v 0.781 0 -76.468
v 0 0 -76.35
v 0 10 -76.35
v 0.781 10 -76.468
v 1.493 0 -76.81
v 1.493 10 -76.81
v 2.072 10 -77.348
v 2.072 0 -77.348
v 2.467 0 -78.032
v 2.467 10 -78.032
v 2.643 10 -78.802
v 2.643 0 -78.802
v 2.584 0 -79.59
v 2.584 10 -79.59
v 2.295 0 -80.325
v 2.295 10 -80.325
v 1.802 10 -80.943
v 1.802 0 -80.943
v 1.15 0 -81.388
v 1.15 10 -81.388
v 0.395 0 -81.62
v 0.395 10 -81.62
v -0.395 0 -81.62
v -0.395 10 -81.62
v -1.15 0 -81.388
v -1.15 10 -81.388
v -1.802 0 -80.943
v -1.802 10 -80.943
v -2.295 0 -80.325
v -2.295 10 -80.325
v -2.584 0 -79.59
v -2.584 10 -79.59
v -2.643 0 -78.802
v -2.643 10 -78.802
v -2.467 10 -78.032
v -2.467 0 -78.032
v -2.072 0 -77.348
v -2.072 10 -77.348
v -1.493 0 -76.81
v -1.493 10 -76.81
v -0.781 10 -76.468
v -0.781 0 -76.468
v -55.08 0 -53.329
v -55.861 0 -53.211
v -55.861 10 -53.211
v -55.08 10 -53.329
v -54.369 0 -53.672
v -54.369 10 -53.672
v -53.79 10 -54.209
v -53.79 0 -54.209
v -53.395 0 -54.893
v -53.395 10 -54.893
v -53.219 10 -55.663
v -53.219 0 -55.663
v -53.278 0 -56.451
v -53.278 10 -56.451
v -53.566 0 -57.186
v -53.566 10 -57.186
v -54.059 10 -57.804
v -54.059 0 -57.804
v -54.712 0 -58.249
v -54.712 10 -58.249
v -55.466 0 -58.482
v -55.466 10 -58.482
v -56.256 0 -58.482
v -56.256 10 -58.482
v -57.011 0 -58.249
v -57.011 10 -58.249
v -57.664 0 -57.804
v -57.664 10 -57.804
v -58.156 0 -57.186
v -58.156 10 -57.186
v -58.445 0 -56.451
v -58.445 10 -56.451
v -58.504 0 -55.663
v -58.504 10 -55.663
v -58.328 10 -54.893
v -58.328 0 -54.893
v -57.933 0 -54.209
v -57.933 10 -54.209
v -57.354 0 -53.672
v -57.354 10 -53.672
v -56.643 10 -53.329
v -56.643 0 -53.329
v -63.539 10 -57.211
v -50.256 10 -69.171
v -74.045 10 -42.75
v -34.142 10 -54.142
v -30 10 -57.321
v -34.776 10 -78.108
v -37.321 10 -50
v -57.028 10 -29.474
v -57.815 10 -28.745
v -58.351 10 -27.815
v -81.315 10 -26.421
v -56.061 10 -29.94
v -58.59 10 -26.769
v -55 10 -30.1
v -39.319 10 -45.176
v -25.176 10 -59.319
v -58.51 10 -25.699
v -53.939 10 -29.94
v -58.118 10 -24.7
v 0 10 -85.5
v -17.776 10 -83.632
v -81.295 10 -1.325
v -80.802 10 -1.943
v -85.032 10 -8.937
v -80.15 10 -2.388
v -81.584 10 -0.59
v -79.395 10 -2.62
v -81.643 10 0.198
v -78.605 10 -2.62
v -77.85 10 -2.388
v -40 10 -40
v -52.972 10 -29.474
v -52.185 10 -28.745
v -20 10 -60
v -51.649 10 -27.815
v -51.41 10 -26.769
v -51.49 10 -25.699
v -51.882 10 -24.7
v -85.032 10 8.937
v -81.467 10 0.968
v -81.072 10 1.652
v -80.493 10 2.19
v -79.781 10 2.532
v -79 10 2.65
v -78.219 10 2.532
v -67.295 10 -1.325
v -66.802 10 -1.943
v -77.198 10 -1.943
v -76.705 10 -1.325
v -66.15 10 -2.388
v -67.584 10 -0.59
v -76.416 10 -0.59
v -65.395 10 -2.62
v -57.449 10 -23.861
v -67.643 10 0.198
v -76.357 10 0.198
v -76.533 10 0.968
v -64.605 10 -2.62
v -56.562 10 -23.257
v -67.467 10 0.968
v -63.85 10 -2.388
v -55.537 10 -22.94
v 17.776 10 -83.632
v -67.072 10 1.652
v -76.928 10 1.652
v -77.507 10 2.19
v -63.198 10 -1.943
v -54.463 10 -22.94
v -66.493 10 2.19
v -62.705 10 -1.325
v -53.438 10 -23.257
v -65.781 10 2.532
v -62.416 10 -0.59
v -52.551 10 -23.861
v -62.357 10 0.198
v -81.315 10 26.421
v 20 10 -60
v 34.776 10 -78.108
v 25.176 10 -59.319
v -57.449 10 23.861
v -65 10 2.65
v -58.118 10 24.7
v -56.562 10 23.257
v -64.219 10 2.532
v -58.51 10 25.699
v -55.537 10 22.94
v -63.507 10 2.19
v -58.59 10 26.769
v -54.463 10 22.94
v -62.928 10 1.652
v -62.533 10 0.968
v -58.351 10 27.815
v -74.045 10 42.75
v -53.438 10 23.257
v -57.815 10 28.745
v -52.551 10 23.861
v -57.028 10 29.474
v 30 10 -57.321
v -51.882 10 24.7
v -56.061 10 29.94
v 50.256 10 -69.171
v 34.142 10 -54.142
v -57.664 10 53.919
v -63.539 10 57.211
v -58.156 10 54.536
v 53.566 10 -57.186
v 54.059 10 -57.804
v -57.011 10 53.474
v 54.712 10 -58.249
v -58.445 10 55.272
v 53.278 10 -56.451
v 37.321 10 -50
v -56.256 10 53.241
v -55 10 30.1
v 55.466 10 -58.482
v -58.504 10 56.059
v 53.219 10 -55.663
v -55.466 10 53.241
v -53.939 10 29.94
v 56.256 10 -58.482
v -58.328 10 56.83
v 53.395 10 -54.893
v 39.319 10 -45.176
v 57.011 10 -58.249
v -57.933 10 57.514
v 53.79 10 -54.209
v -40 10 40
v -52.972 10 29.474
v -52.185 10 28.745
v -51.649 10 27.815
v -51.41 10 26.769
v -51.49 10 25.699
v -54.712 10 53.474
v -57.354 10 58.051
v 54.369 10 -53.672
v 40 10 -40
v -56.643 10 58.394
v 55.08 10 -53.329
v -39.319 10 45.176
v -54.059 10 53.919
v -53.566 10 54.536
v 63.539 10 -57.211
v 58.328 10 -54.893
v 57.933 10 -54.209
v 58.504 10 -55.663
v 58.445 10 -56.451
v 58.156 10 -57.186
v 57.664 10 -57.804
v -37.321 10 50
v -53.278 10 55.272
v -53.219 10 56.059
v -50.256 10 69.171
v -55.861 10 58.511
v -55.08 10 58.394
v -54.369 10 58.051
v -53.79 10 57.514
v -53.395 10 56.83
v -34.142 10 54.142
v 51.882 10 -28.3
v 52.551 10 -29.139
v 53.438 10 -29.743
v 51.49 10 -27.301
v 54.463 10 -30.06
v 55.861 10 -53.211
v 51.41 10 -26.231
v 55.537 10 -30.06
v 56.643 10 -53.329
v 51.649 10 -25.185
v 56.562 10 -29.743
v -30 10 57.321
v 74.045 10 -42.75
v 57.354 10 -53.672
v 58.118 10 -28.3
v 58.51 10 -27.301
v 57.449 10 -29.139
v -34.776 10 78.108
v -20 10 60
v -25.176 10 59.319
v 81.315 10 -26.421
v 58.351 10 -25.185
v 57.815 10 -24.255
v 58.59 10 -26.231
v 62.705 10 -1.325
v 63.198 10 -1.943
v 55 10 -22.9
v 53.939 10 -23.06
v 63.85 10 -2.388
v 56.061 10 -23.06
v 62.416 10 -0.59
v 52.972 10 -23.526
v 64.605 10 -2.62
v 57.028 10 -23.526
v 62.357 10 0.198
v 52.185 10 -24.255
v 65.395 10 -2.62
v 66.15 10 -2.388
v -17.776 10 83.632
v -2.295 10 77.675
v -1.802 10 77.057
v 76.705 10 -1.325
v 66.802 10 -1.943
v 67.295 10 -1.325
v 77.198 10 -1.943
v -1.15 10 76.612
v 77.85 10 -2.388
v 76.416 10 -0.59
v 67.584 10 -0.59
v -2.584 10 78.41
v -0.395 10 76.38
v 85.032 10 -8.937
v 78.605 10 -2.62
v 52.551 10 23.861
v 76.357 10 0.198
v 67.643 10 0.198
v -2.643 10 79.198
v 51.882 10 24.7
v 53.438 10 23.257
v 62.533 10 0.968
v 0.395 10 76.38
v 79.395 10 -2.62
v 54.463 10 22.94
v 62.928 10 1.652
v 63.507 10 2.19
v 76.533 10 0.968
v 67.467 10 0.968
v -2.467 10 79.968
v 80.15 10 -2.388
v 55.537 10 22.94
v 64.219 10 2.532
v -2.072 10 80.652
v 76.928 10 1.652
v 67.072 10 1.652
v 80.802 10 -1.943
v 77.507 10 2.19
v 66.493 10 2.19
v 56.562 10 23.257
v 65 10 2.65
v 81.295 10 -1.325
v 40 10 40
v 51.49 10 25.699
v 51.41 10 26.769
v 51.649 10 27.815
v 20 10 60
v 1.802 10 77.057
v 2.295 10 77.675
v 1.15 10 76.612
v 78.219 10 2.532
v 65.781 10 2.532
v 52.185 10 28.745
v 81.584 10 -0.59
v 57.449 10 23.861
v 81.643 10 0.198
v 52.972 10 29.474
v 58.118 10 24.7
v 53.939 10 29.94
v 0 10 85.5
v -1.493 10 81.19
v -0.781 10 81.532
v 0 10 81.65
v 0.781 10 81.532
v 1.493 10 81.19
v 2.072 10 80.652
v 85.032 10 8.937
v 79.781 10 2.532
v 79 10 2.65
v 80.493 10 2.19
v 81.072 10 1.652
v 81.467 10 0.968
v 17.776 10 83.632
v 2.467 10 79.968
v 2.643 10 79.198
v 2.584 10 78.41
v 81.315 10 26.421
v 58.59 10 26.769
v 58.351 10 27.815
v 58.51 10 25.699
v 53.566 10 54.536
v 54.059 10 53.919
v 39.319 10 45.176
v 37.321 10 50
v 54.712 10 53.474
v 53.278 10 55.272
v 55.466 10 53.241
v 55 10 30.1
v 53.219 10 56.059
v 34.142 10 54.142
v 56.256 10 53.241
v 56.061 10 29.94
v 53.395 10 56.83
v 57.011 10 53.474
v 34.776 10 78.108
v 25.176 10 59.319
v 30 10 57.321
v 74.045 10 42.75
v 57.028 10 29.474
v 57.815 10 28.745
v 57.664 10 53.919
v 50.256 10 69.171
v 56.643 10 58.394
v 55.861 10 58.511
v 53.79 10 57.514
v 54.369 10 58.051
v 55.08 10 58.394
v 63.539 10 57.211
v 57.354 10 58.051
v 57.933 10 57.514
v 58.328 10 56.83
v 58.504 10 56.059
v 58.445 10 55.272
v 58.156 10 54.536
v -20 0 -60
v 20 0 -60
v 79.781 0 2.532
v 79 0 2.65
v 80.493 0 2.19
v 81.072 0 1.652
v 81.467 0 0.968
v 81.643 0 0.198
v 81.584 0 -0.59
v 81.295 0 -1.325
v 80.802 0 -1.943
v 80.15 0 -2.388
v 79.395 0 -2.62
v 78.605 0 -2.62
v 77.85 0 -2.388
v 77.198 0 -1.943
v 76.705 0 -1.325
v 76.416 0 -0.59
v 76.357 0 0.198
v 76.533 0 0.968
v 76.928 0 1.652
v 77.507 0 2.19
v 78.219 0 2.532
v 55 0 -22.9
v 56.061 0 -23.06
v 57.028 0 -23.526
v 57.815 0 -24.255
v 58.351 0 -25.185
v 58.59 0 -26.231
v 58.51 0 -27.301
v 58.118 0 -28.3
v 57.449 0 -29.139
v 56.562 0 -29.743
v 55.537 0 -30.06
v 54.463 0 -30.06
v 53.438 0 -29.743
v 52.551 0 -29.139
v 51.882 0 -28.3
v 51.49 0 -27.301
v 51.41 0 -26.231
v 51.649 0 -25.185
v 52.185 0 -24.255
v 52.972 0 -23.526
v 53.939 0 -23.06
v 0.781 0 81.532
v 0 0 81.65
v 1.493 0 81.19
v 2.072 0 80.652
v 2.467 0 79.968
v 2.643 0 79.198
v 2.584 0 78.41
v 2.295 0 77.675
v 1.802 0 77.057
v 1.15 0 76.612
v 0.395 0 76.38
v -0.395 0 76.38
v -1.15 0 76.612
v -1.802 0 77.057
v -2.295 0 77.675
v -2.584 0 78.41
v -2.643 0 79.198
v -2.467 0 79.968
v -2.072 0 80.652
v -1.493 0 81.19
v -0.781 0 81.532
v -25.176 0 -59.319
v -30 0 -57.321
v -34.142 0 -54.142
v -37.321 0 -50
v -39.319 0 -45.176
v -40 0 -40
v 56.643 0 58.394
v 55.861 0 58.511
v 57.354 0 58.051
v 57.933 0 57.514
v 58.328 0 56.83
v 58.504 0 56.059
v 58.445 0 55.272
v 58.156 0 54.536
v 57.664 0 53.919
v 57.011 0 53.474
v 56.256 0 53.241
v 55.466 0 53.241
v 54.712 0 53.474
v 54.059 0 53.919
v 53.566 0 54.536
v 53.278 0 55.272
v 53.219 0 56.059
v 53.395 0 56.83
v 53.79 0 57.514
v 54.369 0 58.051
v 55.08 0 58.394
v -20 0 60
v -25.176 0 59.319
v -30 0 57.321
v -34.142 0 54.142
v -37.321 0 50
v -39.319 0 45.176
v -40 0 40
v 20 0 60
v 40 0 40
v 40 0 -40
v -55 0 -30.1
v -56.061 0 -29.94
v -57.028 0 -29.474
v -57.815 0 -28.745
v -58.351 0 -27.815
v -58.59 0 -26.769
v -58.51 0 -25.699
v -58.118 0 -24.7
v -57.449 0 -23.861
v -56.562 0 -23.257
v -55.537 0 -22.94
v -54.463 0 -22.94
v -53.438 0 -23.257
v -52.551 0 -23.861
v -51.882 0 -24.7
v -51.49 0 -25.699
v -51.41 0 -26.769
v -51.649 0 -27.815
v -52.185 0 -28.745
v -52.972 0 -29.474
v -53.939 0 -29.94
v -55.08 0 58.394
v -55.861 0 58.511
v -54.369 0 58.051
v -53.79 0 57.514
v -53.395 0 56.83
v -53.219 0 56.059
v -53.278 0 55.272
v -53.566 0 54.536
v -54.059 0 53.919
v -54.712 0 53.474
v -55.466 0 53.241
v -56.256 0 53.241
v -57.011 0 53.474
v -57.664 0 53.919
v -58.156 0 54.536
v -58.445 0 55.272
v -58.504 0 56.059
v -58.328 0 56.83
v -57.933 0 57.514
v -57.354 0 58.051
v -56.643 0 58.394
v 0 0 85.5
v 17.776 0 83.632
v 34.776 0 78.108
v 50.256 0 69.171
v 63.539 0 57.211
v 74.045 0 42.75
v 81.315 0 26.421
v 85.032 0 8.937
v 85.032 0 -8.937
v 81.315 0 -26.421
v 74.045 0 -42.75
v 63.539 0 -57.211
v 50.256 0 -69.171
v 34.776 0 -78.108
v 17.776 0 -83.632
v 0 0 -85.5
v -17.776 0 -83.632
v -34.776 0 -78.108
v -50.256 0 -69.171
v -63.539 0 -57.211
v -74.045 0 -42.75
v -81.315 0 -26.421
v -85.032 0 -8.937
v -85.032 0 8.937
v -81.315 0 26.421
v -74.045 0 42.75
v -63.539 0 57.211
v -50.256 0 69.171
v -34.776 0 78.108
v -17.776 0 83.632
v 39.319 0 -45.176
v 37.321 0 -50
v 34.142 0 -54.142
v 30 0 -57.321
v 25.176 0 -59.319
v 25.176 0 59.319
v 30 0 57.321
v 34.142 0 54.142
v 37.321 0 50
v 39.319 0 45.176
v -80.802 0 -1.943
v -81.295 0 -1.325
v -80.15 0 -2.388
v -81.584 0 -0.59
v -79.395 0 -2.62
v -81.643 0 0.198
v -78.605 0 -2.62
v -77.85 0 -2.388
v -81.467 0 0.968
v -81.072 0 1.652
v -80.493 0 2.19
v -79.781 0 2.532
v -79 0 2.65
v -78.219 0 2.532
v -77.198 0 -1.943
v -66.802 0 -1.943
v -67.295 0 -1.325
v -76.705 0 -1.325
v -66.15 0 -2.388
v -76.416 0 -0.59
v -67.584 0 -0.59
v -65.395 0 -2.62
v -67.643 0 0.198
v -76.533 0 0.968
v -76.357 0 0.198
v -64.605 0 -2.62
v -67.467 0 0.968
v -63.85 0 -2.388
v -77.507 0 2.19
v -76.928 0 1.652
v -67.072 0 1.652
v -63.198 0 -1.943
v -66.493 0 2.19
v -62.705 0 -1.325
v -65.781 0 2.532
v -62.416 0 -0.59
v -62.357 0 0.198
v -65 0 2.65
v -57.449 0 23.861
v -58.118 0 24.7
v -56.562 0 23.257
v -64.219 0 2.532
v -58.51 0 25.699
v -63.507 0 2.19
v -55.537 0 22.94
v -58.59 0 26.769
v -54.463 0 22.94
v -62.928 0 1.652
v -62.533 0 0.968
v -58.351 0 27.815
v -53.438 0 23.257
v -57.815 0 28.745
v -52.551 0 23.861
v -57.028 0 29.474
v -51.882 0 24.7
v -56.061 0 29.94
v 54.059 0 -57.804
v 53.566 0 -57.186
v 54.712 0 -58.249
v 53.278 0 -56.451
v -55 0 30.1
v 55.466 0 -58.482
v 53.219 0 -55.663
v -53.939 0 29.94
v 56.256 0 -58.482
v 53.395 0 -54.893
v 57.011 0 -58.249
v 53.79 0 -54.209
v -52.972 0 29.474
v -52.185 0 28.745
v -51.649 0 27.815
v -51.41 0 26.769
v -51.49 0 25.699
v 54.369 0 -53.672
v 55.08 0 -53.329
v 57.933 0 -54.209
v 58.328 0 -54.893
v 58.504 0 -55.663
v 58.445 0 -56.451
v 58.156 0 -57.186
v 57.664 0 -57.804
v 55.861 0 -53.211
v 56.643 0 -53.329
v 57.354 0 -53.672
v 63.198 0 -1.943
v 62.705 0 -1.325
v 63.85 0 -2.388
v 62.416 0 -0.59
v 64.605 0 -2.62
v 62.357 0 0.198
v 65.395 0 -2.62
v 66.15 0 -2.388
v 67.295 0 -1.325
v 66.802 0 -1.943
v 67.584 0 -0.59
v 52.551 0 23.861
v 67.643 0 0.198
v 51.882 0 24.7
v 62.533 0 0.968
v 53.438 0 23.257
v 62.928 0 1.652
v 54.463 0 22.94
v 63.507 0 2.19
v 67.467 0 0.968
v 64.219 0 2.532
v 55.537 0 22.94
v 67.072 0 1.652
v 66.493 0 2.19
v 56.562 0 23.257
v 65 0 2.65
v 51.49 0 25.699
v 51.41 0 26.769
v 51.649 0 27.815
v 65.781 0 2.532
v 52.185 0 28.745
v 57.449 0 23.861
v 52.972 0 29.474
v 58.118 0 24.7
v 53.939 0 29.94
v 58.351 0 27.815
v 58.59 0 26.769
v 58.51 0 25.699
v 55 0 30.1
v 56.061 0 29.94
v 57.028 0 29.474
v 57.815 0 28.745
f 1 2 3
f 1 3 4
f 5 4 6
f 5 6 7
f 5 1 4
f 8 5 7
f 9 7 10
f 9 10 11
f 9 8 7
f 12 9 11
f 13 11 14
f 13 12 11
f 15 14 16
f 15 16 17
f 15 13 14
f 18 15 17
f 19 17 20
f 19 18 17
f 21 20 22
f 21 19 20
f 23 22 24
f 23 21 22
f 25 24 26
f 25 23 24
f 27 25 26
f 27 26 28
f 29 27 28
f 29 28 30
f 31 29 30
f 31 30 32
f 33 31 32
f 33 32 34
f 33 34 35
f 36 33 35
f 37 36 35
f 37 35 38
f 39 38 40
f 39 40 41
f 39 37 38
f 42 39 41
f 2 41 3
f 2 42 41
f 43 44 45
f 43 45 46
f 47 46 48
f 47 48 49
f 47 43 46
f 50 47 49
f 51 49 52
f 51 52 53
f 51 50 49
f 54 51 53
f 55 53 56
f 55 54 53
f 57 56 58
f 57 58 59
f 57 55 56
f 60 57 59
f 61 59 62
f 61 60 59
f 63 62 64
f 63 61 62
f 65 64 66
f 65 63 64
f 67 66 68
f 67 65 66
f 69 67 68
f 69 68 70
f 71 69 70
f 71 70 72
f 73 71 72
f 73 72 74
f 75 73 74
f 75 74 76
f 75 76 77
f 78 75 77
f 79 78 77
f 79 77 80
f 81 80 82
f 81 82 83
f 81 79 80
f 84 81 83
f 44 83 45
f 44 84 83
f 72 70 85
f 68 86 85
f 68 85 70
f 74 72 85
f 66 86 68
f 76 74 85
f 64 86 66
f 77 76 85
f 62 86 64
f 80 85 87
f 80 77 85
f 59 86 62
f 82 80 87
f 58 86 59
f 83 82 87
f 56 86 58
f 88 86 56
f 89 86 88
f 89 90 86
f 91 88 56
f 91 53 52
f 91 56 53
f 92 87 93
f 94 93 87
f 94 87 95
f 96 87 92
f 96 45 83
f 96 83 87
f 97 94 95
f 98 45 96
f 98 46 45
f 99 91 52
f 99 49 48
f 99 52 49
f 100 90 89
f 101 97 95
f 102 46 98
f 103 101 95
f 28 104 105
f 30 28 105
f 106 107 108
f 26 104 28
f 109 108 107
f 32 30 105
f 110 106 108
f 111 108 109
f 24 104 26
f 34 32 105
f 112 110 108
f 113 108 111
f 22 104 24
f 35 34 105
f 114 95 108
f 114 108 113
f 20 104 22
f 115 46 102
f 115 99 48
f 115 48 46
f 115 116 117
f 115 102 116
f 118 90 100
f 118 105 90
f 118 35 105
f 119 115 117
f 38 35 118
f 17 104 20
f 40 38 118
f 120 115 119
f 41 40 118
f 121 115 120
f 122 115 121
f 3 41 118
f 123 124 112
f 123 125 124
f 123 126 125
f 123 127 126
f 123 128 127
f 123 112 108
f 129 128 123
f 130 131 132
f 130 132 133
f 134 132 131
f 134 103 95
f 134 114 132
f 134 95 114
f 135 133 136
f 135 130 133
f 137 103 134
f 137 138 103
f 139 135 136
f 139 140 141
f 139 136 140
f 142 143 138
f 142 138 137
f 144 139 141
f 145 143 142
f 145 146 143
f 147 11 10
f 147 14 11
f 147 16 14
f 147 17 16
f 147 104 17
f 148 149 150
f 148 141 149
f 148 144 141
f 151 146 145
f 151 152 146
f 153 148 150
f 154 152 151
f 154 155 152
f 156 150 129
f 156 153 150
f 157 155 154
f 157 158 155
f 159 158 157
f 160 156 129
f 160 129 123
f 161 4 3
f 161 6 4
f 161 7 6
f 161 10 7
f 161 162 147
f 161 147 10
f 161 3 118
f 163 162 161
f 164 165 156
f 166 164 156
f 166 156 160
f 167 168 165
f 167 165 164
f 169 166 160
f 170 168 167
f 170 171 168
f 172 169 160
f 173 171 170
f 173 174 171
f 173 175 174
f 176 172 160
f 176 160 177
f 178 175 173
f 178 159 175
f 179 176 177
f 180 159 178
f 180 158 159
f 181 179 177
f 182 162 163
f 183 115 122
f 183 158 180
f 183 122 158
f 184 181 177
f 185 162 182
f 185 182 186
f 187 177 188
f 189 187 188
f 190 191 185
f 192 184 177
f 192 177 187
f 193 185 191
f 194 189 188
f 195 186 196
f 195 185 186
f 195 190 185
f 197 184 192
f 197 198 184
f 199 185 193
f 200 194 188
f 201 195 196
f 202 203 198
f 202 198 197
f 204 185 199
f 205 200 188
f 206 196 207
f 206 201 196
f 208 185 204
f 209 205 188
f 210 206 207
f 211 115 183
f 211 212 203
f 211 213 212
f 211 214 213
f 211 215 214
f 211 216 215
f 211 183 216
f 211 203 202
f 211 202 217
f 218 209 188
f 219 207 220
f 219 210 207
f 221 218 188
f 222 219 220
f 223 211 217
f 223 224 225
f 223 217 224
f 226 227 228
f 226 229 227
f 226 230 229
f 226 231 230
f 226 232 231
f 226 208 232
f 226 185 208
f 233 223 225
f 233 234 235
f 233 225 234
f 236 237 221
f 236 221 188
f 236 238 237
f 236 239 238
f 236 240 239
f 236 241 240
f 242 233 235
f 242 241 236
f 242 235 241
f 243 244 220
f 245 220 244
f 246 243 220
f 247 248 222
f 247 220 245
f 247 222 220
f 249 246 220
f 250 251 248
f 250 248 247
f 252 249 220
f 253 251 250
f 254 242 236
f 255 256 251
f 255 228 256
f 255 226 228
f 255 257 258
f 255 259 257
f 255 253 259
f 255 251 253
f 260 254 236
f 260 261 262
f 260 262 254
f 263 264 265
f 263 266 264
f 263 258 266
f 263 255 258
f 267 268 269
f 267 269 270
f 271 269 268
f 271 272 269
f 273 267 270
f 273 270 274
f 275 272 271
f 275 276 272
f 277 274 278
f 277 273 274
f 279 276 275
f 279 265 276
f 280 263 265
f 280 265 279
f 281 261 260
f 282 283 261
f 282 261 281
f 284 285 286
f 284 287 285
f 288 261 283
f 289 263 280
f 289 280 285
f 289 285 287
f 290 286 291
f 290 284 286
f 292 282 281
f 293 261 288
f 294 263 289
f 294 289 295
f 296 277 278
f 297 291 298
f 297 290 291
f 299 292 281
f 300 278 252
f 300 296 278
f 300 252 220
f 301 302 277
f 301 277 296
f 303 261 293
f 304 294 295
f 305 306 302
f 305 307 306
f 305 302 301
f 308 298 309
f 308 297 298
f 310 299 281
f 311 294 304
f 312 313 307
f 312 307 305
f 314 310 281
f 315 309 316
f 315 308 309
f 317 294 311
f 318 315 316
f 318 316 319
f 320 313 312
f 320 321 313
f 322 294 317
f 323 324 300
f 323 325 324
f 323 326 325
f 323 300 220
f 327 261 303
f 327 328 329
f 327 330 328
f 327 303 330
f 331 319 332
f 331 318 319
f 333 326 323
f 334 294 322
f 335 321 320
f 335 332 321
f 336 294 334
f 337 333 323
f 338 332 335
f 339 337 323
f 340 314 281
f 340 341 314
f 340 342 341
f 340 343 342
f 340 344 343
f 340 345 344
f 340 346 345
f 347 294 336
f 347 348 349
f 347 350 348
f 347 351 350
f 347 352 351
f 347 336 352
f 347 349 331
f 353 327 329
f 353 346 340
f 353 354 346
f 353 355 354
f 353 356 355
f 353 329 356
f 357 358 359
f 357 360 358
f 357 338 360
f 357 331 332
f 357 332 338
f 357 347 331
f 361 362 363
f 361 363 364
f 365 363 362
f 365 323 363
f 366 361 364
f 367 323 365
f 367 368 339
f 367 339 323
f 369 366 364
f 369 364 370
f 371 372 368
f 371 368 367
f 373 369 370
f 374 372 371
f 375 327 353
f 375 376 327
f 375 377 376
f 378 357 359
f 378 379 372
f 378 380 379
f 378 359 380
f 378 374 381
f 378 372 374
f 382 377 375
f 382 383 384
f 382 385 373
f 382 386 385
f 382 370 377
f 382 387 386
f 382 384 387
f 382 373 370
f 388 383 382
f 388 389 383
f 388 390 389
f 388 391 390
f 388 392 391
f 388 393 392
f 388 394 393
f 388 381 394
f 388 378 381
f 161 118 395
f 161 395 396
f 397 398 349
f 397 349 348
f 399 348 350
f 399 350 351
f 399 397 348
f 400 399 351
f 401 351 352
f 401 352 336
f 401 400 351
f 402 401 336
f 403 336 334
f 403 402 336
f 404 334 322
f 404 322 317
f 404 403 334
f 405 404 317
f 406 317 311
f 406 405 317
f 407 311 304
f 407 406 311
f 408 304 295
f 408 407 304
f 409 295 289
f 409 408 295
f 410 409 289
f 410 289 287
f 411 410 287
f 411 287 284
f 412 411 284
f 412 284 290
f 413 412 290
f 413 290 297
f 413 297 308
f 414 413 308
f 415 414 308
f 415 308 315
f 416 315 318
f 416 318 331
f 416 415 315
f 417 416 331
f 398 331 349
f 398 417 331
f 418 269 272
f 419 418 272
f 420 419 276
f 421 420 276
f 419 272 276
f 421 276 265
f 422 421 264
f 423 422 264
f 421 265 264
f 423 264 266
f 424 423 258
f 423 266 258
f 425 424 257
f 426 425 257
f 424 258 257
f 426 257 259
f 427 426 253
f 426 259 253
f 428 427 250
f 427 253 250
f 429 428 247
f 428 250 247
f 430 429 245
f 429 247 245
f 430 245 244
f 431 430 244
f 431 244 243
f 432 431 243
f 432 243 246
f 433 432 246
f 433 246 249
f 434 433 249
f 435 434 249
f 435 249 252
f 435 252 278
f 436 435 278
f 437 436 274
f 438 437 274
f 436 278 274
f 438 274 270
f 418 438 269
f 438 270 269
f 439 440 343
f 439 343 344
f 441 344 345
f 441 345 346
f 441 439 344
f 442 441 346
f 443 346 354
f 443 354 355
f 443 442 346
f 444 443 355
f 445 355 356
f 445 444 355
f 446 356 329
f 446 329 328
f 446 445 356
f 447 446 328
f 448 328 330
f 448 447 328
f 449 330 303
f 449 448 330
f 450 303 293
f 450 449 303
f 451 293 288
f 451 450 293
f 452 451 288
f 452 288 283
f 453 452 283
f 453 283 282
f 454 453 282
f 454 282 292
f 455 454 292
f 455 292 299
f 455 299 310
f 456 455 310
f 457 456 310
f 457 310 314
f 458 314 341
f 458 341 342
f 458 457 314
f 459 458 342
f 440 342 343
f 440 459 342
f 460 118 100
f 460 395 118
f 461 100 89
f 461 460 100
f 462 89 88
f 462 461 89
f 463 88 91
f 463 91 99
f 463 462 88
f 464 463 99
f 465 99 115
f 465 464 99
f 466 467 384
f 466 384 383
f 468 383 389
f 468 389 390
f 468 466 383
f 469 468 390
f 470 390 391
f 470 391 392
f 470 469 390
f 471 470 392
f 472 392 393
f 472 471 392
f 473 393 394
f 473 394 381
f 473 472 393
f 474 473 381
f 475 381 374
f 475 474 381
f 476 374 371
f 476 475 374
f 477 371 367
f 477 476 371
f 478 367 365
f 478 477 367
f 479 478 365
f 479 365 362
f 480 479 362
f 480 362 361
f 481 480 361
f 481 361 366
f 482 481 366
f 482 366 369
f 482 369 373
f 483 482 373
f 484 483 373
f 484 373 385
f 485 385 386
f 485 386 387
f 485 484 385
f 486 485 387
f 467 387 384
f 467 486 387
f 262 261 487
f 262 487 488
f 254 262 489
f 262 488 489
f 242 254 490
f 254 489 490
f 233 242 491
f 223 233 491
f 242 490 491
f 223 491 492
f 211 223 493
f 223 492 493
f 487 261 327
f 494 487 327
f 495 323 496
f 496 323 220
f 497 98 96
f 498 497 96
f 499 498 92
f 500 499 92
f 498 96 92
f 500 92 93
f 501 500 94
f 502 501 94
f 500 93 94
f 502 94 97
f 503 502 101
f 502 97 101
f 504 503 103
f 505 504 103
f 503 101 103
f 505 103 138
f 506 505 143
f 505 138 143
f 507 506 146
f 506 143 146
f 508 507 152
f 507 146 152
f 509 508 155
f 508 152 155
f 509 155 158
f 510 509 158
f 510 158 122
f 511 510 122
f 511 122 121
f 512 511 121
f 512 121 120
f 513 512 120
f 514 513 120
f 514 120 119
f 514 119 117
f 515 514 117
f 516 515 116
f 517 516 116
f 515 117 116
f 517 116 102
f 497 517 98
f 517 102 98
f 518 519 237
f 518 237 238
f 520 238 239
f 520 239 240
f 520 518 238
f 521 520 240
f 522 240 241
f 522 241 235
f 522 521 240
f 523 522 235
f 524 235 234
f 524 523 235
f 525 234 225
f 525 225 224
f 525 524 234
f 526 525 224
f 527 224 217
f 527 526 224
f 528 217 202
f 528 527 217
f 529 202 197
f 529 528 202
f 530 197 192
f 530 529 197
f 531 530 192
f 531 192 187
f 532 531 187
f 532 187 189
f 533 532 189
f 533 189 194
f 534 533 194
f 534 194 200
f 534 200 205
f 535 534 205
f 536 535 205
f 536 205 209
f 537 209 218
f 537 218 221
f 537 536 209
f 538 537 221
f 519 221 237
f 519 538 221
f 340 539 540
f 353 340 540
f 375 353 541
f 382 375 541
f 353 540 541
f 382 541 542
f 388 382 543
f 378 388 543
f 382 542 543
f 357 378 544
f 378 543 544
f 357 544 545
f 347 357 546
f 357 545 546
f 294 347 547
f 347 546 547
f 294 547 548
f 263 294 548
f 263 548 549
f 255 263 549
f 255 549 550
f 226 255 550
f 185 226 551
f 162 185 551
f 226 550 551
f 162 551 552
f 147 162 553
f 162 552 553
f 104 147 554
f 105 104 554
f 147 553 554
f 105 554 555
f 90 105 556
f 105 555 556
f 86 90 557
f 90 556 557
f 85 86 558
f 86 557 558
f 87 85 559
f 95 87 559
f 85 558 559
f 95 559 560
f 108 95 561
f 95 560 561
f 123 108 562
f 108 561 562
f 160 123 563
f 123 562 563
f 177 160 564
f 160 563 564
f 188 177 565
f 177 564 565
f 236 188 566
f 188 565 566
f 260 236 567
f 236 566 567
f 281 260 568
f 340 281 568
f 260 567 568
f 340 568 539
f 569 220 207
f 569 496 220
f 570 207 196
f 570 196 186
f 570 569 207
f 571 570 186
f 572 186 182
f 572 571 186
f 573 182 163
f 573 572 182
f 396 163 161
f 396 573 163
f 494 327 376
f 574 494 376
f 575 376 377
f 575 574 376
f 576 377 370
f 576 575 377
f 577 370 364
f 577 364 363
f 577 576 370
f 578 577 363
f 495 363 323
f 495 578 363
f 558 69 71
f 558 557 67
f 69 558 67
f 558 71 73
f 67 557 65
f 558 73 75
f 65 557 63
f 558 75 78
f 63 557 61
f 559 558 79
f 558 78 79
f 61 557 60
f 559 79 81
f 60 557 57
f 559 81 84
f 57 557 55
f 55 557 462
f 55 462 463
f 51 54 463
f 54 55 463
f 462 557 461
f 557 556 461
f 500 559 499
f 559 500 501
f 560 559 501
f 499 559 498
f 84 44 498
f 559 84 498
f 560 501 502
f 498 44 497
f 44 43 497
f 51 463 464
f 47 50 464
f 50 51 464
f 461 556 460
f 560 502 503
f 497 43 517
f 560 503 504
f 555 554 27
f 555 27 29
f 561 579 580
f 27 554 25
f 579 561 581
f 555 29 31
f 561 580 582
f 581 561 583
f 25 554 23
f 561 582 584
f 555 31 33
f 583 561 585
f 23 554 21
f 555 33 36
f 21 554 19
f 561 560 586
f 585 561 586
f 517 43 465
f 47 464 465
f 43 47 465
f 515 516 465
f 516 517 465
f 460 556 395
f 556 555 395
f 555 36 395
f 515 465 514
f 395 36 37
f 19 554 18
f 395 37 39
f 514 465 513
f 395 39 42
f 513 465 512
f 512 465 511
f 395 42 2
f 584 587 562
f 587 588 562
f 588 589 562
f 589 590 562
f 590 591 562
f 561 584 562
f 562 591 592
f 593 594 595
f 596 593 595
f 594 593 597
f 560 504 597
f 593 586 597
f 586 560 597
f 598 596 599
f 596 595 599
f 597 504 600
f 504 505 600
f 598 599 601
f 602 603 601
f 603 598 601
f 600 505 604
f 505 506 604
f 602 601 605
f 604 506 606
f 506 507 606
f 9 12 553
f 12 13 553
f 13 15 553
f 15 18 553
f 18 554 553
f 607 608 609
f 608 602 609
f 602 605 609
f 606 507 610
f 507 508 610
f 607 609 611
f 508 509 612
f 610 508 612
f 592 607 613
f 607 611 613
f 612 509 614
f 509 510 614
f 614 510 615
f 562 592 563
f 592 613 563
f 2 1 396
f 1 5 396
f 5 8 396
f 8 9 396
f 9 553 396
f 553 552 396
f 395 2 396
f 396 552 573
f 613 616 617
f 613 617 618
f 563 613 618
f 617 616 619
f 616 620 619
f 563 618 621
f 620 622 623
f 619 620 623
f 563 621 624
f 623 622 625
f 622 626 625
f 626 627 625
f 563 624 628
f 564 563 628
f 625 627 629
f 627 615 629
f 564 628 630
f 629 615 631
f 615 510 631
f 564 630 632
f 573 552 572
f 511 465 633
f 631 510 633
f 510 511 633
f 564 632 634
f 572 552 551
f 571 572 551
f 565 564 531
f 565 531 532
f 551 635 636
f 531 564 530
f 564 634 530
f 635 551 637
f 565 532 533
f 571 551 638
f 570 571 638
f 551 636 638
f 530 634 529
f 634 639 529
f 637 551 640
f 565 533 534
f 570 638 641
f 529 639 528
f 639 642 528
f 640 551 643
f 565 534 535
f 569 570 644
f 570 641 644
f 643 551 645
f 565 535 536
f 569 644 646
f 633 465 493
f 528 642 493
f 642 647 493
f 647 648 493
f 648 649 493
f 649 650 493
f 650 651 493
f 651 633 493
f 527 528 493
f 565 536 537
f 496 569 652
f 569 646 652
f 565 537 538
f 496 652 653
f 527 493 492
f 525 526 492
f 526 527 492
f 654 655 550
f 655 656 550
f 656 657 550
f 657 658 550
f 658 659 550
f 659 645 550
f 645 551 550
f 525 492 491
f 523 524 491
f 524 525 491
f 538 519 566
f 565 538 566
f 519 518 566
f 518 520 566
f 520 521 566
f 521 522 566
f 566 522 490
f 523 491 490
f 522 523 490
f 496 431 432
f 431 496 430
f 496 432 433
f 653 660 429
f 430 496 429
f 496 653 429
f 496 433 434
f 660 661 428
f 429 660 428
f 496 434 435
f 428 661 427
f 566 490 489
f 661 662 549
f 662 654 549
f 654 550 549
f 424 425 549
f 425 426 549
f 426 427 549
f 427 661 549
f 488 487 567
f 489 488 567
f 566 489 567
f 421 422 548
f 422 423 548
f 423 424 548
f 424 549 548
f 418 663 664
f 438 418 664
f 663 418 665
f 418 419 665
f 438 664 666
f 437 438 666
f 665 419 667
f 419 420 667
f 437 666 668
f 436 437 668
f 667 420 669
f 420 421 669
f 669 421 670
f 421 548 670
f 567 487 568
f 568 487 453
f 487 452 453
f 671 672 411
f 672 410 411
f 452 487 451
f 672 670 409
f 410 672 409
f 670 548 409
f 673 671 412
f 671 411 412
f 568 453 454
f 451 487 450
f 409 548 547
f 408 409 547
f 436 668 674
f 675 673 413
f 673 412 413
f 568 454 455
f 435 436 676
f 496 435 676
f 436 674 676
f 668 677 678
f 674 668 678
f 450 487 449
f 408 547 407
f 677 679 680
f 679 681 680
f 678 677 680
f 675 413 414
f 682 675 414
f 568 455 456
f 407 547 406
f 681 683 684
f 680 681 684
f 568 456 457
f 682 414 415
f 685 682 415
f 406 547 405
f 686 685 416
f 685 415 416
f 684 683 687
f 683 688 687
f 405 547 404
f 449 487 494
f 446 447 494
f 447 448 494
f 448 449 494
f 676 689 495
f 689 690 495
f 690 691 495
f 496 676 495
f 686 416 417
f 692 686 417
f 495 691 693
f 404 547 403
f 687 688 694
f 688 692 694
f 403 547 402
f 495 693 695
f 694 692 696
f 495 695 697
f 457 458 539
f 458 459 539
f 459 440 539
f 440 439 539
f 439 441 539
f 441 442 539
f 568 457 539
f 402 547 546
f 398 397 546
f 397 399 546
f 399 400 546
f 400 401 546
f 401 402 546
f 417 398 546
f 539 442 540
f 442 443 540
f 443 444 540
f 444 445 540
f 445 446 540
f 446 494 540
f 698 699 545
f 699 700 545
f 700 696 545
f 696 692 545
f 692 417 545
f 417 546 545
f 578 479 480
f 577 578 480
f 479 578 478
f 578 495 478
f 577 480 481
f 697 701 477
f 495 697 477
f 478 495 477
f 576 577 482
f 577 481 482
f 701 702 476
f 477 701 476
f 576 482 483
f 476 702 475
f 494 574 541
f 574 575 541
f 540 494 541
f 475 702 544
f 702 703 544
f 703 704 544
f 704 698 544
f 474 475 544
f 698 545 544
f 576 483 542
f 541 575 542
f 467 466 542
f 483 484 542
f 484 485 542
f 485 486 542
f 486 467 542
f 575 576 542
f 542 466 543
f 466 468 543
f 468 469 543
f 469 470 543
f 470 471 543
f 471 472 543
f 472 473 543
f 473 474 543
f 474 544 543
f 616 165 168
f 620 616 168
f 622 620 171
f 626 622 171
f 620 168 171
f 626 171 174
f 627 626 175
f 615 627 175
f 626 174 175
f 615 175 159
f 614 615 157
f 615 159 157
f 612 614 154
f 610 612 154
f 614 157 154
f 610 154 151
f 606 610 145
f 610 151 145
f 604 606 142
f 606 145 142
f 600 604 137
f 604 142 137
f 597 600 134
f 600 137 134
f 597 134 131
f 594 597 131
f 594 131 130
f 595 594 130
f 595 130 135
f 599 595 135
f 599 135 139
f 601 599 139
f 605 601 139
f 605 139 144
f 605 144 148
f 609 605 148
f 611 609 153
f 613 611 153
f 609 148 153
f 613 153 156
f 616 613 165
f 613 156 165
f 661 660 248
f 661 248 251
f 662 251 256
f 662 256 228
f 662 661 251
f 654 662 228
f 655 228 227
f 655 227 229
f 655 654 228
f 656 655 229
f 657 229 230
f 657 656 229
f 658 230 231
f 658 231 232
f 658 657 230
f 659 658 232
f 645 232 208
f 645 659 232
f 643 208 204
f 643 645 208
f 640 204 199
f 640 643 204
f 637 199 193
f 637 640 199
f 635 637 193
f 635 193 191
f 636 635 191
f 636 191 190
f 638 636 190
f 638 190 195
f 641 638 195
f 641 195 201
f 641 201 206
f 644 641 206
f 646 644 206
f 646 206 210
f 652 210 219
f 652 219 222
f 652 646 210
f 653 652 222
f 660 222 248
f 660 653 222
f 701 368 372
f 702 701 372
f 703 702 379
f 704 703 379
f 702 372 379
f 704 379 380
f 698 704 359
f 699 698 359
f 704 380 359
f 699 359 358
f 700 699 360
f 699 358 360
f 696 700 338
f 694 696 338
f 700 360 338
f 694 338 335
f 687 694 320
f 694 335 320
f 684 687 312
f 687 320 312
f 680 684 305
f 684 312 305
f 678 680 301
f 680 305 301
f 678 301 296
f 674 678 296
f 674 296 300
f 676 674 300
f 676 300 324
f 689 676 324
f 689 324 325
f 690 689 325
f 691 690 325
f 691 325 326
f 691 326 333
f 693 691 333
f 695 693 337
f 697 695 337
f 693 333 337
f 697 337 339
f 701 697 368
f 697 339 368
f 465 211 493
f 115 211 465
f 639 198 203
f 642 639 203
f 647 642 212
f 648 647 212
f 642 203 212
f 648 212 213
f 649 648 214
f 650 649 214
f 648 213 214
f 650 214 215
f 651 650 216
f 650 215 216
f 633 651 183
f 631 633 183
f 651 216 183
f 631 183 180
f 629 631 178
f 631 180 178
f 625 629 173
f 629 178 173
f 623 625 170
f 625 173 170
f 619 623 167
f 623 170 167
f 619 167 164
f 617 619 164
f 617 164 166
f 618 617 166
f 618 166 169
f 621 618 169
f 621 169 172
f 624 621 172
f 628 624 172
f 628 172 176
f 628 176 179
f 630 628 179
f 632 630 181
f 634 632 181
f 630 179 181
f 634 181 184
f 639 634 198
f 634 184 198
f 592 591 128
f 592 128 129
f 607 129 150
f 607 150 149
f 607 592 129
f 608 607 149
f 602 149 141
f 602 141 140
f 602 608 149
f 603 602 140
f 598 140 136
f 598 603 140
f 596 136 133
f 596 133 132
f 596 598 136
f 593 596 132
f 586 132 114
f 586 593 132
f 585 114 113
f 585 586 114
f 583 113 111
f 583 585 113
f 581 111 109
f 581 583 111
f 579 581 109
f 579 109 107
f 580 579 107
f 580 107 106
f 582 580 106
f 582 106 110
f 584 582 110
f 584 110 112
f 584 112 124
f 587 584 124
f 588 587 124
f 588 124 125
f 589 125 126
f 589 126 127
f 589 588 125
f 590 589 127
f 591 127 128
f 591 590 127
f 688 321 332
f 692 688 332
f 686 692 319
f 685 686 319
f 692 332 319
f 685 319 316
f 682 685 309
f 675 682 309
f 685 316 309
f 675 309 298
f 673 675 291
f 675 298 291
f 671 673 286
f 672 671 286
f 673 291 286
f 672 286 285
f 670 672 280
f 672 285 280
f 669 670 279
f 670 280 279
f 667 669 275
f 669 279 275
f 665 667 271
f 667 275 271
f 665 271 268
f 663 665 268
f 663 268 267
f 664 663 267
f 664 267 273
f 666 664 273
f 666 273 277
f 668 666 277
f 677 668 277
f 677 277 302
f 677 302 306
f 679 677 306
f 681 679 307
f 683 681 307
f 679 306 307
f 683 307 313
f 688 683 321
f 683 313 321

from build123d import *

# Parameters (mm, degrees)
SKETCH_1_R          = 85.5
SKETCH_1_R_2        = 2.65
SKETCH_1_W          = 80
SKETCH_1_H          = 100
EXTRUDE_3_DEPTH     = 10
SKETCH_10_R         = 3.6
SKETCH_10_R_2       = 2.65
CUT_EXTRUDE_2_DEPTH = 10
SKETCH_11_W         = 80
SKETCH_11_H         = 120
CUT_EXTRUDE_3_DEPTH = 10
FILLET_1_R          = 20


with BuildPart() as part:
    # 草图1 → 凸台-拉伸3 (new body)
    with BuildSketch(Plane(origin=(0, 0, 0), x_dir=(1, 0, 0), z_dir=(0, 1, 0))):
        with Locations(Location((0, 0, 0), (0, 0, 270))):
            Circle(SKETCH_1_R)
        with Locations(Location((0, 79, 0), (0, 0, 270))):
            Circle(SKETCH_1_R_2, mode=Mode.SUBTRACT)
        with Locations(Location((55.861435714, 55.861435714, 0), (0, 0, 270))):
            Circle(SKETCH_1_R_2, mode=Mode.SUBTRACT)
        with Locations(Location((79, 0, 0), (0, 0, 270))):
            Circle(SKETCH_1_R_2, mode=Mode.SUBTRACT)
        with Locations(Location((55.861435714, -55.861435714, 0), (0, 0, 270))):
            Circle(SKETCH_1_R_2, mode=Mode.SUBTRACT)
        with Locations(Location((0, -79, 0), (0, 0, 270))):
            Circle(SKETCH_1_R_2, mode=Mode.SUBTRACT)
        with Locations(Location((-55.861435714, -55.861435714, 0), (0, 0, 270))):
            Circle(SKETCH_1_R_2, mode=Mode.SUBTRACT)
        with Locations(Location((-79, 0, 0), (0, 0, 270))):
            Circle(SKETCH_1_R_2, mode=Mode.SUBTRACT)
        with Locations(Location((-55.861435714, 55.861435714, 0), (0, 0, 270))):
            Circle(SKETCH_1_R_2, mode=Mode.SUBTRACT)
        Rectangle(SKETCH_1_W, SKETCH_1_H, mode=Mode.SUBTRACT)
    extrude(amount=EXTRUDE_3_DEPTH)

    # 草图10 → 切除-拉伸2 (cut)
    with BuildSketch(Plane(origin=(0, 10, 0), x_dir=(1, 0, 0), z_dir=(0, 1, 0))):
        with Locations(Location((55, 26.5, 0), (0, 0, 270))):
            Circle(SKETCH_10_R)
        with Locations(Location((65, 0, 0), (0, 0, 270))):
            Circle(SKETCH_10_R_2)
        with Locations(Location((55, -26.5, 0), (0, 0, 270))):
            Circle(SKETCH_10_R)
        with Locations(Location((-55, -26.5, 0), (0, 0, 270))):
            Circle(SKETCH_10_R)
        with Locations(Location((-55, 26.5, 0), (0, 0, 90))):
            Circle(SKETCH_10_R)
        with Locations(Location((-65, 0, 0), (0, 0, 270))):
            Circle(SKETCH_10_R_2)
    extrude(amount=-CUT_EXTRUDE_2_DEPTH, mode=Mode.SUBTRACT)

    # 草图11 → 切除-拉伸3 (cut)
    with BuildSketch(Plane(origin=(0, 10, 0), x_dir=(1, 0, 0), z_dir=(0, 1, 0))):
        Rectangle(SKETCH_11_W, SKETCH_11_H)
    extrude(amount=-CUT_EXTRUDE_3_DEPTH, mode=Mode.SUBTRACT)

    # 圆角1
    fillet_1_edges = [part.edges().sort_by_distance(p)[0] for p in [
        (40, 5, -60),
        (40, 5, 60),
        (-40, 5, 60),
        (-40, 5, -60),
    ]]
    fillet(fillet_1_edges, radius=FILLET_1_R)


solid = part.part
